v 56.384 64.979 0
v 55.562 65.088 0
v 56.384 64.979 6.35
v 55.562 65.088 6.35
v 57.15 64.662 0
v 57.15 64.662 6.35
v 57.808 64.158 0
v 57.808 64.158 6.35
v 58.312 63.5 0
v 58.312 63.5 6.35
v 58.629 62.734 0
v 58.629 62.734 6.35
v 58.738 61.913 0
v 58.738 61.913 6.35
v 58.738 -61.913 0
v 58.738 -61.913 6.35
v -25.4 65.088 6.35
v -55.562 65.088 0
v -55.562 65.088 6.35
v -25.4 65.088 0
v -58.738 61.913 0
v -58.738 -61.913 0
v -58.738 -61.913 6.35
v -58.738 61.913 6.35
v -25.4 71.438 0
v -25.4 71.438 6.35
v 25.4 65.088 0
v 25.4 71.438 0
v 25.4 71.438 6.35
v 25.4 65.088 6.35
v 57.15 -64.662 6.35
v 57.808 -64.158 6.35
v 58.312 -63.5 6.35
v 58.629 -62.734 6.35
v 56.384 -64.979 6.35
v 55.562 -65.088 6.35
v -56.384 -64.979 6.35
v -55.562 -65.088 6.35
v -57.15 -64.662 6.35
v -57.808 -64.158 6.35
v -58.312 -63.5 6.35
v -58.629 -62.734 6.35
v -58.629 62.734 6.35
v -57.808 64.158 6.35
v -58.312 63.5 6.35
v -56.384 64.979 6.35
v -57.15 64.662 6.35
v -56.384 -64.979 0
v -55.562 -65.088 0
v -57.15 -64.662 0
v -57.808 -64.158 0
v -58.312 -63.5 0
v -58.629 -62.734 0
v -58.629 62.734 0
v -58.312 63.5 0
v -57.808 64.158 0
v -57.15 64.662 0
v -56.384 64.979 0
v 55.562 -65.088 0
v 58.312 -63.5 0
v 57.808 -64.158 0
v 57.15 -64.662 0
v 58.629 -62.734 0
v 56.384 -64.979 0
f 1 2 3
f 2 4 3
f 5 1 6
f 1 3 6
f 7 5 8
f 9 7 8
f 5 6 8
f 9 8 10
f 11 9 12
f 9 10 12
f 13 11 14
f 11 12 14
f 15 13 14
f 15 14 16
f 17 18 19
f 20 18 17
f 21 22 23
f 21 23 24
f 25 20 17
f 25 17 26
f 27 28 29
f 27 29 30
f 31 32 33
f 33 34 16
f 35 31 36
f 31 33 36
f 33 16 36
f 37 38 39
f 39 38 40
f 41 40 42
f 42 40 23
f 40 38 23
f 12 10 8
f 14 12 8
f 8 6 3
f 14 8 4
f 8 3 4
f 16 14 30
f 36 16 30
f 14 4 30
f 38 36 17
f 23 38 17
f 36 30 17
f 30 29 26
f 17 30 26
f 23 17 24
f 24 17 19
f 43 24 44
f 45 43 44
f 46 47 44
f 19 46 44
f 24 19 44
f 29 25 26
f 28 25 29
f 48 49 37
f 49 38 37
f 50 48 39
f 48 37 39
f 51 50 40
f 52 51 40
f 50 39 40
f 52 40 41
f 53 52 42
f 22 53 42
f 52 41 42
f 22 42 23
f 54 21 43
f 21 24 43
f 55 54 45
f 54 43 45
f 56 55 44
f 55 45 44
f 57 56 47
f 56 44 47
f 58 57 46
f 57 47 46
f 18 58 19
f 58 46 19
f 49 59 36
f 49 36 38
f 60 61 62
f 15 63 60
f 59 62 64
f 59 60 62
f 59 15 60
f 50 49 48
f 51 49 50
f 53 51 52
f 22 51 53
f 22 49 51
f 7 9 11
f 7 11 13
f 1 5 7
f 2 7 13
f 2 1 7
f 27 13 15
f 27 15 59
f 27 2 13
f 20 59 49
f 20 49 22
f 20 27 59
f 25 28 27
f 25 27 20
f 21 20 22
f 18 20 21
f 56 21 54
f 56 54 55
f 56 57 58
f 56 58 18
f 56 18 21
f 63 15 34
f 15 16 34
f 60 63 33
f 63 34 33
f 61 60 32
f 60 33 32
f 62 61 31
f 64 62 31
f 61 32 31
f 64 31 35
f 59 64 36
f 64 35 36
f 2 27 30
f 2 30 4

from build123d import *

# Parameters (mm, degrees)
BOSS_EXTRUDE1_DEPTH = 6.35
FILLET1_R           = 3.175


with BuildPart() as part:
    # Sketch2 → Boss-Extrude1 (new body)
    with BuildSketch(Plane.XY):
        Polygon((25.4, 65.0875), (58.7375, 65.0875), (58.7375, -65.0875), (-58.7375, -65.0875), (-58.7375, 65.0875), (-25.4, 65.0875), (-25.4, 71.4375), (25.4, 71.4375), align=None)
    extrude(amount=BOSS_EXTRUDE1_DEPTH)

    # Fillet1
    fillet1_edges = [part.edges().sort_by_distance(p)[0] for p in [
        (-58.7375, -65.0875, 3.175),
        (58.7375, -65.0875, 3.175),
        (58.7375, 65.0875, 3.175),
        (-58.7375, 65.0875, 3.175),
    ]]
    fillet(fillet1_edges, radius=FILLET1_R)


solid = part.part
